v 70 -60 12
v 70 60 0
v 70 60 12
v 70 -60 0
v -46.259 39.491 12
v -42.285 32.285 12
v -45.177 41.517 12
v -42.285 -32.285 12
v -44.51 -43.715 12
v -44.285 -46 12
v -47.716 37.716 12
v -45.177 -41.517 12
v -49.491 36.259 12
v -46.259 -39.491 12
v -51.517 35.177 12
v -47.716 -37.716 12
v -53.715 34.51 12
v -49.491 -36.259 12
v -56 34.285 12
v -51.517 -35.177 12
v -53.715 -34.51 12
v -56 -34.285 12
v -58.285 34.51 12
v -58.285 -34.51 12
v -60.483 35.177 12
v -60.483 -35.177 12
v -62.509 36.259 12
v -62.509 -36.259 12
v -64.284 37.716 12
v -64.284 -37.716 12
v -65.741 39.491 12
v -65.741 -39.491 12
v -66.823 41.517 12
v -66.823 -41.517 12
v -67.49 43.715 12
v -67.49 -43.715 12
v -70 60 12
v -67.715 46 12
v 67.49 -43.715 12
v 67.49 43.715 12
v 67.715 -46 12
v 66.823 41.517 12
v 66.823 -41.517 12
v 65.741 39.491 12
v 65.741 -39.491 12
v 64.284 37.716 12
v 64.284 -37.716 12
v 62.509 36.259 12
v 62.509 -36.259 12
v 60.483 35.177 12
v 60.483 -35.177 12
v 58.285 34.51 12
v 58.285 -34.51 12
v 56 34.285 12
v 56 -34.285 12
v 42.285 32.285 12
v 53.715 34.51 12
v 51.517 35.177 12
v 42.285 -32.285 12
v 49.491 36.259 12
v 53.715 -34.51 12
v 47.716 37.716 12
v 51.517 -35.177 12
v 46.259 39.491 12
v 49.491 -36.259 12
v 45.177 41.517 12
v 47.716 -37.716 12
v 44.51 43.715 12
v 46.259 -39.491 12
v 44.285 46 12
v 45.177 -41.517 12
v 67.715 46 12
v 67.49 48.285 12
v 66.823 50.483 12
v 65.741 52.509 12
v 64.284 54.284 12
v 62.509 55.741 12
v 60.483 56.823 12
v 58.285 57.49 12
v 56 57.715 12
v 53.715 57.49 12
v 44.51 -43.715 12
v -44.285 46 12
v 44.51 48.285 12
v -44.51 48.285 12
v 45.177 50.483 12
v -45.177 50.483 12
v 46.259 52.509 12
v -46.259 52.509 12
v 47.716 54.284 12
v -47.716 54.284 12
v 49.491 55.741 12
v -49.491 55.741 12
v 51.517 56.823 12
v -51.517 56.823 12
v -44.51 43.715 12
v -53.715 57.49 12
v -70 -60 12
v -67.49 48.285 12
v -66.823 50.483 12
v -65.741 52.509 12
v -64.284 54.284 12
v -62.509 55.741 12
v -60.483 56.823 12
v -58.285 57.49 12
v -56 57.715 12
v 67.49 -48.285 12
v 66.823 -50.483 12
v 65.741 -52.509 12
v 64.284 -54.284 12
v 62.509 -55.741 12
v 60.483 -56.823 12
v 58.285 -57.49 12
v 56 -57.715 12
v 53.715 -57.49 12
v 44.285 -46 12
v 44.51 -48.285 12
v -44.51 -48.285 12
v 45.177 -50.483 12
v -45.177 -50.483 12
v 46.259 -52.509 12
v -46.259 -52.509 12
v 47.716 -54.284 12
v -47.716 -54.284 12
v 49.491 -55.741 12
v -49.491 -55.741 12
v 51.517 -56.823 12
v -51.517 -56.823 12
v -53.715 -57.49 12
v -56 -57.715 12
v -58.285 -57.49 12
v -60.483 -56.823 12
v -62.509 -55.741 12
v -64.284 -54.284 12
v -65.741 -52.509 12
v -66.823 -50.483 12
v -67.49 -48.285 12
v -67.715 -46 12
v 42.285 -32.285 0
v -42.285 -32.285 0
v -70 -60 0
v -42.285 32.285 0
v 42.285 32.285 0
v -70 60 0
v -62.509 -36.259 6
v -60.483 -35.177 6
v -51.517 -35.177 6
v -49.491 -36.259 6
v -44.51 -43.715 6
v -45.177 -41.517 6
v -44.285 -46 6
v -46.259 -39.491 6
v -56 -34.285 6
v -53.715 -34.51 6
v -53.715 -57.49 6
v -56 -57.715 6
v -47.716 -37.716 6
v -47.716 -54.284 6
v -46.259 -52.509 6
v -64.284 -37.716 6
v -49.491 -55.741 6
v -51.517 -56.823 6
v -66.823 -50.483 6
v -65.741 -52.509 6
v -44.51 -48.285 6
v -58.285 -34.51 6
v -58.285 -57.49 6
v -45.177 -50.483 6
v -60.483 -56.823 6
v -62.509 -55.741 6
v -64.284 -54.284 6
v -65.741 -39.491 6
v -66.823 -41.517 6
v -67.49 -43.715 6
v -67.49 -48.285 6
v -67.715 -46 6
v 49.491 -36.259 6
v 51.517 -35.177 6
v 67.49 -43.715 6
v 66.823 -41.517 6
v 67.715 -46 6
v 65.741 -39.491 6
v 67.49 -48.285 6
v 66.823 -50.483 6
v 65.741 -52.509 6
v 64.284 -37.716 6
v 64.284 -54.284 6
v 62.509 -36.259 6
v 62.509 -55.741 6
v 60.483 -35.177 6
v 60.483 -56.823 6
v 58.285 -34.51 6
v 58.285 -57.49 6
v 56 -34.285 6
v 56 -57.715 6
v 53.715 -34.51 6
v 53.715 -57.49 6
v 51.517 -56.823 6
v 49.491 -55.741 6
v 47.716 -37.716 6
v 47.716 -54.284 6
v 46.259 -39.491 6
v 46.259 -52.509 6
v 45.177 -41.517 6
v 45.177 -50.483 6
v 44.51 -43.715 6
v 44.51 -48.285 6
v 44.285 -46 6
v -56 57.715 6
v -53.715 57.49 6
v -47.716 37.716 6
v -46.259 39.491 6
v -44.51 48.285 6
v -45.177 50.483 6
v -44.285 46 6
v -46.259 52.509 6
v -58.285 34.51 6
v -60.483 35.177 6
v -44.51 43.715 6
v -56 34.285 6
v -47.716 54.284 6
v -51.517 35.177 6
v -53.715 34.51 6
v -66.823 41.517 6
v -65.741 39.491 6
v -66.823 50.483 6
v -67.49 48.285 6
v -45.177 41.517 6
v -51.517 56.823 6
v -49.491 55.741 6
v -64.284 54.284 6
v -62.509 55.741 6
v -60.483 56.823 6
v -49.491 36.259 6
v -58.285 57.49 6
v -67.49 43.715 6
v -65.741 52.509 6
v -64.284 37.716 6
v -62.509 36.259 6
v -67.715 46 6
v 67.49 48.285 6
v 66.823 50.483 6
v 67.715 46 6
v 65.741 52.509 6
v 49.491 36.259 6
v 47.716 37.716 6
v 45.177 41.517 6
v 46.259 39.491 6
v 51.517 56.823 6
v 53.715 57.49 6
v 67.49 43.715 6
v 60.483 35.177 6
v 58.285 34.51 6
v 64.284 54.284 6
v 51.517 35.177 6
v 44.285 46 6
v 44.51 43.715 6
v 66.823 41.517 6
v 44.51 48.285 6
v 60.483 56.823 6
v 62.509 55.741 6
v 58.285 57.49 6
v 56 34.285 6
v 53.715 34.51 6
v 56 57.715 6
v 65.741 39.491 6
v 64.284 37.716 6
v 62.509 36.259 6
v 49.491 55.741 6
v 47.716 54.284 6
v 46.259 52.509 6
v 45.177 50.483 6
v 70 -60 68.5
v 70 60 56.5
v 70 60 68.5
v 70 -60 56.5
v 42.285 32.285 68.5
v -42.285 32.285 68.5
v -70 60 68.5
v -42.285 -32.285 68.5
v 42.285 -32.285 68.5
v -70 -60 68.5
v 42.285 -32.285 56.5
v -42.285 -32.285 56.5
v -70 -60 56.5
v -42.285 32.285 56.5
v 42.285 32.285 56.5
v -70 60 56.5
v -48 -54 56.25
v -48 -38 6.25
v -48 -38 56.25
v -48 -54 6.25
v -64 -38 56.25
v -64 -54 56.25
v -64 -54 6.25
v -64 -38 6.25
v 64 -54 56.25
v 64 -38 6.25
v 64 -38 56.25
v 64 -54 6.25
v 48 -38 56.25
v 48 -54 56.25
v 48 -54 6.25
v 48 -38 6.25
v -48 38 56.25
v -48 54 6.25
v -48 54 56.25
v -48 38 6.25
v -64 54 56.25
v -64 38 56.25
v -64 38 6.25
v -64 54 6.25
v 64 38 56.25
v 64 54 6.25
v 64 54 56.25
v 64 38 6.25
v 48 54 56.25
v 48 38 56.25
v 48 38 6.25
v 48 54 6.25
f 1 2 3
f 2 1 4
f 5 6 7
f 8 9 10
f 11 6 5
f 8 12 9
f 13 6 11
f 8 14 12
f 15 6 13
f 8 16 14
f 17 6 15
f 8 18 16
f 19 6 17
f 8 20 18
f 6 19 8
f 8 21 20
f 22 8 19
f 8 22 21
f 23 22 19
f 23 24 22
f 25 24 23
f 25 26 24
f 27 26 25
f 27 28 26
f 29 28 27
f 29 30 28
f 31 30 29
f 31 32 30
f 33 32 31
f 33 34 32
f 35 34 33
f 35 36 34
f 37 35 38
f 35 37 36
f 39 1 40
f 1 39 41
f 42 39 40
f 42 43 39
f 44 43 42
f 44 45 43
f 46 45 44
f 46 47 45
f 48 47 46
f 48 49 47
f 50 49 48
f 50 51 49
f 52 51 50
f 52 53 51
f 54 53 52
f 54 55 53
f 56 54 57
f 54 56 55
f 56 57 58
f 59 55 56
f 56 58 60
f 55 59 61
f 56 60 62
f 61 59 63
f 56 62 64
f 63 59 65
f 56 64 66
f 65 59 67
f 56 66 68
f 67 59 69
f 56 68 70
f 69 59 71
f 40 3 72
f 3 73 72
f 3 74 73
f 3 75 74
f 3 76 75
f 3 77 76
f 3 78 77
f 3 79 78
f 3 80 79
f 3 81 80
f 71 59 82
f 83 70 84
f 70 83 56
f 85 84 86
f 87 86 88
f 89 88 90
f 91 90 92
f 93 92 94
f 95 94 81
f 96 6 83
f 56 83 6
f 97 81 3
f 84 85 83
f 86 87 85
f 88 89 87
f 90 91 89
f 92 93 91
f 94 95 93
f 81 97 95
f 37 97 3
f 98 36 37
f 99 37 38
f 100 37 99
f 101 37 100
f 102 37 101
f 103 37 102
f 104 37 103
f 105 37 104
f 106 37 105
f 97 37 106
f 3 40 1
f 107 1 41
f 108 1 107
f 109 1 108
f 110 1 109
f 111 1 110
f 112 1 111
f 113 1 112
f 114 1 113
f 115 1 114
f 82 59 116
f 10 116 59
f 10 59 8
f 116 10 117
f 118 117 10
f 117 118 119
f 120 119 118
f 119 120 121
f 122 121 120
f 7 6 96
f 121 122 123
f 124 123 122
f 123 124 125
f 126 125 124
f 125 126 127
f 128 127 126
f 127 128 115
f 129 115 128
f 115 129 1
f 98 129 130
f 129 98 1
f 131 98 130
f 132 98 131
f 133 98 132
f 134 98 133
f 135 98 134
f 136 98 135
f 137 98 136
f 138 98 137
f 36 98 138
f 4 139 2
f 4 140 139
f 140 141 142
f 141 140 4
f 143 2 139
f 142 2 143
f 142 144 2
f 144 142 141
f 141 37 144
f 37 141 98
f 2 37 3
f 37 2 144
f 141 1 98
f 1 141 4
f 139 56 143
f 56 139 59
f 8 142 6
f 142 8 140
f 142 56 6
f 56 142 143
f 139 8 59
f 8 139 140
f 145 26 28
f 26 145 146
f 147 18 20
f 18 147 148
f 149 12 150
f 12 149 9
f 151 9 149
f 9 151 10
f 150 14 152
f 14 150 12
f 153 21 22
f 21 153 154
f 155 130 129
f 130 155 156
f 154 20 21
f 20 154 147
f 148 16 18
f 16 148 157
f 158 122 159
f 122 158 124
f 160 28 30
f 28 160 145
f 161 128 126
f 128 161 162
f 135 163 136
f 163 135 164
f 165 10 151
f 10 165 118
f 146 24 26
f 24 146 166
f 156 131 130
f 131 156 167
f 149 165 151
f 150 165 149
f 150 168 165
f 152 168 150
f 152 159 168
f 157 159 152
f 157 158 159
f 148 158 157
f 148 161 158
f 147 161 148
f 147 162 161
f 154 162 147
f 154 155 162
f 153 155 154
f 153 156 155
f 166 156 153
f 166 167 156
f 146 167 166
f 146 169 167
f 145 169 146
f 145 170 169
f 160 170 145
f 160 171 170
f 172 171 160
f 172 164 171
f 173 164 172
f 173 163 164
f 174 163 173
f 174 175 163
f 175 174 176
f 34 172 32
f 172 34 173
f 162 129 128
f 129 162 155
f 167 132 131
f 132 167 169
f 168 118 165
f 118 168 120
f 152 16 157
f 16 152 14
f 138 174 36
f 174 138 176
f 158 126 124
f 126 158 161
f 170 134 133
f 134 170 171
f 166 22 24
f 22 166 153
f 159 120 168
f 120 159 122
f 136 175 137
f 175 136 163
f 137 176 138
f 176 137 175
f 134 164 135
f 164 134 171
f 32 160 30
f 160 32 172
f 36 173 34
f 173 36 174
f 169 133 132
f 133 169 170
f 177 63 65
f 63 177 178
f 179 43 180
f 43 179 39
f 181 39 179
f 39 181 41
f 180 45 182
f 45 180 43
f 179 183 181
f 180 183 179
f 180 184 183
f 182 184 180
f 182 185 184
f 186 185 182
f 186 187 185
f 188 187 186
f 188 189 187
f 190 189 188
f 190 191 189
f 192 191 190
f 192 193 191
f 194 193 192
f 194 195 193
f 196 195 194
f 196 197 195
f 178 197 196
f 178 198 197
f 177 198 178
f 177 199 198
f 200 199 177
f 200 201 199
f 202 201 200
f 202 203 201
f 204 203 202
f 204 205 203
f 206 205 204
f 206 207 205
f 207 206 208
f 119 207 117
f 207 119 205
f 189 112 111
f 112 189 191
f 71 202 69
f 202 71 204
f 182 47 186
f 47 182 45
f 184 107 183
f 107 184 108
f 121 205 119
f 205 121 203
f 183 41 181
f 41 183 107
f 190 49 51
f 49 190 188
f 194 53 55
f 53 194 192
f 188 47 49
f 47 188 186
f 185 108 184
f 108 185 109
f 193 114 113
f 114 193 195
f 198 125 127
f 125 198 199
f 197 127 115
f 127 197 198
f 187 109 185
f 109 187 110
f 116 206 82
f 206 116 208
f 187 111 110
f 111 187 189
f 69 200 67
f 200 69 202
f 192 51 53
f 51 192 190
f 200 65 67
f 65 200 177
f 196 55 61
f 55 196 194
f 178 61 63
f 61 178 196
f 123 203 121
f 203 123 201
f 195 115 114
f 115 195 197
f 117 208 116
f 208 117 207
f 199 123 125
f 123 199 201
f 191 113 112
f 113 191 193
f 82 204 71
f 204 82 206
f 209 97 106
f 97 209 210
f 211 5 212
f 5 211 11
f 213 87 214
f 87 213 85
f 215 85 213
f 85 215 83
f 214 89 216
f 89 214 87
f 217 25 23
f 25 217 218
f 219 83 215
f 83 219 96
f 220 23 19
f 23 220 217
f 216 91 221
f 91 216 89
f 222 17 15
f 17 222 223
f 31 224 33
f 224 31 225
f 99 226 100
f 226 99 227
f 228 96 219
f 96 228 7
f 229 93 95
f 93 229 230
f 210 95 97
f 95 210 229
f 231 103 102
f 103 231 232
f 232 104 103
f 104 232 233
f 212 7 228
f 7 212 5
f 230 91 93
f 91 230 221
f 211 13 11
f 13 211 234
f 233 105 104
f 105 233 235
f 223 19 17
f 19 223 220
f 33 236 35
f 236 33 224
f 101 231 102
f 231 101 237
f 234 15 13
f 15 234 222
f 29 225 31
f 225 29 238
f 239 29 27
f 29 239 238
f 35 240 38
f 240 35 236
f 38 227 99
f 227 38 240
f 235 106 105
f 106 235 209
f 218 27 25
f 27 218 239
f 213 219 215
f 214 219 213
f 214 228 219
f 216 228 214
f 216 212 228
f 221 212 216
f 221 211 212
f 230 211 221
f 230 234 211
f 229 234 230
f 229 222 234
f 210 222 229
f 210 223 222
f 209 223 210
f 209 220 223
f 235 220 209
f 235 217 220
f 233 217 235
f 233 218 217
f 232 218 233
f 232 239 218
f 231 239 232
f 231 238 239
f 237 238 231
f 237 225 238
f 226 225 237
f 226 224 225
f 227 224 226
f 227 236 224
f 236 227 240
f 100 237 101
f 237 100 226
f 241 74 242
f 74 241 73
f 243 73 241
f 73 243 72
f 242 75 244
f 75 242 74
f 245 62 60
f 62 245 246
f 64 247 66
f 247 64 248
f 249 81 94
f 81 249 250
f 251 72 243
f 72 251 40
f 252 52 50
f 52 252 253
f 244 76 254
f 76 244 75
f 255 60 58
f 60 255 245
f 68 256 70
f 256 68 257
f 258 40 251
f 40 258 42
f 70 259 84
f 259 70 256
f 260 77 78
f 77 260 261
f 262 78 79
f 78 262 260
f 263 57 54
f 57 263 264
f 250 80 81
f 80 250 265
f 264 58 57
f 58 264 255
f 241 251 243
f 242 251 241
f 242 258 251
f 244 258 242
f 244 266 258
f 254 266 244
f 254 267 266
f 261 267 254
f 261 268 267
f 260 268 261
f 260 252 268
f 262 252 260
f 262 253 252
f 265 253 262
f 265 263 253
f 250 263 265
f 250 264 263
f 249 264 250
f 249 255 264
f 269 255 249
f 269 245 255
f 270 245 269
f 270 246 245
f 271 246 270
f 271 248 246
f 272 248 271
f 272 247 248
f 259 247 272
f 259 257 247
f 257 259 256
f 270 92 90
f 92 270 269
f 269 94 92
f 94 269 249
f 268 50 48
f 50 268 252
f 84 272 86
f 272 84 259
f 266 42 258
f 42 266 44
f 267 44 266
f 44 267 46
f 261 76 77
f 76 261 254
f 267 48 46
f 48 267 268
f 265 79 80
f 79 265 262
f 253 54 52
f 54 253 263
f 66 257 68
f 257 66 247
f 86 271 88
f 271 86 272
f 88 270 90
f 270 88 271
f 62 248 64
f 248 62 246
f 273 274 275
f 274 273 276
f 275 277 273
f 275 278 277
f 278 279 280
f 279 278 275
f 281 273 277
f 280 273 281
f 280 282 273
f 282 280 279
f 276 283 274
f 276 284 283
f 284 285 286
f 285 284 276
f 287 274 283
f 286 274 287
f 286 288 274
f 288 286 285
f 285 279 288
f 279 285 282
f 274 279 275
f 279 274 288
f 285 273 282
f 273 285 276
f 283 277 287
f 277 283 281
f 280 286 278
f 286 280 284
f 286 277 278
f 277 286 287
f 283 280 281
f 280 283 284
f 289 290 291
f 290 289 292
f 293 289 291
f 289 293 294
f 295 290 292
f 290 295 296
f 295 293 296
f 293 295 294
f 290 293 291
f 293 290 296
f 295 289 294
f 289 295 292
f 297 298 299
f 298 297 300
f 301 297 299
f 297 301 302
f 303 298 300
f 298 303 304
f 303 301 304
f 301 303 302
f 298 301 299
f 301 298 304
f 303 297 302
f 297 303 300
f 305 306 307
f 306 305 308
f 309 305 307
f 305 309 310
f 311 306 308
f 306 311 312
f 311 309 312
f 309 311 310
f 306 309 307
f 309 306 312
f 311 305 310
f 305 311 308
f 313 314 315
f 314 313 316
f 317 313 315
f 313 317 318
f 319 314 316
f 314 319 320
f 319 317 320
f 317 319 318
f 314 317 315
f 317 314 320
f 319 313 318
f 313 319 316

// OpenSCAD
$fn = 32;

// ------------------------------------------------------------------------
// Frame cube: base 140 x 120 mm, posts 50 mm tall
// Every part is its own module, assembly() places every instance.
// ------------------------------------------------------------------------

// --- part 1 ---
module base_frame() {
  difference() {
    translate([-70, -60, 0]) cube([140, 120, 12]);
    translate([-42.285, -32.285, -1]) cube([84.57, 64.57, 14]);
    translate([-56, -46, 6]) cylinder(h = 7, d = 23.43);
    translate([56, -46, 6]) cylinder(h = 7, d = 23.43);
    translate([-56, 46, 6]) cylinder(h = 7, d = 23.43);
    translate([56, 46, 6]) cylinder(h = 7, d = 23.43);
  }
}

// --- part 2 ---
module corner_post() {
  translate([-8, -8, 0]) cube([16, 16, 50]);
}

// --- part 3 ---
module top_frame() {
  difference() {
    translate([-70, -60, 0]) cube([140, 120, 12]);
    translate([-42.285, -32.285, -1]) cube([84.57, 64.57, 14]);
  }
}

// --- assembly ---
module assembly() {
  color([0.80, 0.24, 0.20]) translate([0, 0, 0]) rotate([0, 0, 0]) base_frame();
  color([0.20, 0.45, 0.75]) translate([-56, -46, 6.25]) rotate([0, 0, 0]) corner_post();
  color([0.25, 0.62, 0.32]) translate([56, -46, 6.25]) rotate([0, 0, 0]) corner_post();
  color([0.92, 0.70, 0.18]) translate([-56, 46, 6.25]) rotate([0, 0, 0]) corner_post();
  color([0.58, 0.35, 0.70]) translate([56, 46, 6.25]) rotate([0, 0, 0]) corner_post();
  color([0.16, 0.66, 0.66]) translate([0, 0, 56.5]) rotate([0, 0, 0]) top_frame();
}

assembly();
